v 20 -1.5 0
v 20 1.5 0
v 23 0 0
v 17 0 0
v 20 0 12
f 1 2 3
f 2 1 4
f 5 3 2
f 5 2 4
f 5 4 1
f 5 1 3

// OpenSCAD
// file: ../utils/ring.scad
module ring(r1, r2) {
    rotate_extrude() translate([r1,0,0]) circle(r2);
}
// main file
$fn=50;

use <../utils/ring.scad>

module spheres() {
    sphere(d=14);
    translate([0, 0, 9]) sphere(d=7);
}

module dagger() {
    polyhedron(
        points=[[3,0,0],[0, 1.5, 0], [-3, 0, 0], [0, -1.5, 0], [0, 0, 12]],
        faces=[[0, 1, 2, 3], [1, 0, 4], [2, 1, 4], [3, 2, 4], [0, 3, 4]]);
}

//difference() {
//    spheres();
//    translate([0, 0, 10.75]) dagger();
//}
//ring
//translate([0, 0, -8]) rotate([90, 90, 0]) ring(2, 1);

translate([20, 0, 0]) dagger();
